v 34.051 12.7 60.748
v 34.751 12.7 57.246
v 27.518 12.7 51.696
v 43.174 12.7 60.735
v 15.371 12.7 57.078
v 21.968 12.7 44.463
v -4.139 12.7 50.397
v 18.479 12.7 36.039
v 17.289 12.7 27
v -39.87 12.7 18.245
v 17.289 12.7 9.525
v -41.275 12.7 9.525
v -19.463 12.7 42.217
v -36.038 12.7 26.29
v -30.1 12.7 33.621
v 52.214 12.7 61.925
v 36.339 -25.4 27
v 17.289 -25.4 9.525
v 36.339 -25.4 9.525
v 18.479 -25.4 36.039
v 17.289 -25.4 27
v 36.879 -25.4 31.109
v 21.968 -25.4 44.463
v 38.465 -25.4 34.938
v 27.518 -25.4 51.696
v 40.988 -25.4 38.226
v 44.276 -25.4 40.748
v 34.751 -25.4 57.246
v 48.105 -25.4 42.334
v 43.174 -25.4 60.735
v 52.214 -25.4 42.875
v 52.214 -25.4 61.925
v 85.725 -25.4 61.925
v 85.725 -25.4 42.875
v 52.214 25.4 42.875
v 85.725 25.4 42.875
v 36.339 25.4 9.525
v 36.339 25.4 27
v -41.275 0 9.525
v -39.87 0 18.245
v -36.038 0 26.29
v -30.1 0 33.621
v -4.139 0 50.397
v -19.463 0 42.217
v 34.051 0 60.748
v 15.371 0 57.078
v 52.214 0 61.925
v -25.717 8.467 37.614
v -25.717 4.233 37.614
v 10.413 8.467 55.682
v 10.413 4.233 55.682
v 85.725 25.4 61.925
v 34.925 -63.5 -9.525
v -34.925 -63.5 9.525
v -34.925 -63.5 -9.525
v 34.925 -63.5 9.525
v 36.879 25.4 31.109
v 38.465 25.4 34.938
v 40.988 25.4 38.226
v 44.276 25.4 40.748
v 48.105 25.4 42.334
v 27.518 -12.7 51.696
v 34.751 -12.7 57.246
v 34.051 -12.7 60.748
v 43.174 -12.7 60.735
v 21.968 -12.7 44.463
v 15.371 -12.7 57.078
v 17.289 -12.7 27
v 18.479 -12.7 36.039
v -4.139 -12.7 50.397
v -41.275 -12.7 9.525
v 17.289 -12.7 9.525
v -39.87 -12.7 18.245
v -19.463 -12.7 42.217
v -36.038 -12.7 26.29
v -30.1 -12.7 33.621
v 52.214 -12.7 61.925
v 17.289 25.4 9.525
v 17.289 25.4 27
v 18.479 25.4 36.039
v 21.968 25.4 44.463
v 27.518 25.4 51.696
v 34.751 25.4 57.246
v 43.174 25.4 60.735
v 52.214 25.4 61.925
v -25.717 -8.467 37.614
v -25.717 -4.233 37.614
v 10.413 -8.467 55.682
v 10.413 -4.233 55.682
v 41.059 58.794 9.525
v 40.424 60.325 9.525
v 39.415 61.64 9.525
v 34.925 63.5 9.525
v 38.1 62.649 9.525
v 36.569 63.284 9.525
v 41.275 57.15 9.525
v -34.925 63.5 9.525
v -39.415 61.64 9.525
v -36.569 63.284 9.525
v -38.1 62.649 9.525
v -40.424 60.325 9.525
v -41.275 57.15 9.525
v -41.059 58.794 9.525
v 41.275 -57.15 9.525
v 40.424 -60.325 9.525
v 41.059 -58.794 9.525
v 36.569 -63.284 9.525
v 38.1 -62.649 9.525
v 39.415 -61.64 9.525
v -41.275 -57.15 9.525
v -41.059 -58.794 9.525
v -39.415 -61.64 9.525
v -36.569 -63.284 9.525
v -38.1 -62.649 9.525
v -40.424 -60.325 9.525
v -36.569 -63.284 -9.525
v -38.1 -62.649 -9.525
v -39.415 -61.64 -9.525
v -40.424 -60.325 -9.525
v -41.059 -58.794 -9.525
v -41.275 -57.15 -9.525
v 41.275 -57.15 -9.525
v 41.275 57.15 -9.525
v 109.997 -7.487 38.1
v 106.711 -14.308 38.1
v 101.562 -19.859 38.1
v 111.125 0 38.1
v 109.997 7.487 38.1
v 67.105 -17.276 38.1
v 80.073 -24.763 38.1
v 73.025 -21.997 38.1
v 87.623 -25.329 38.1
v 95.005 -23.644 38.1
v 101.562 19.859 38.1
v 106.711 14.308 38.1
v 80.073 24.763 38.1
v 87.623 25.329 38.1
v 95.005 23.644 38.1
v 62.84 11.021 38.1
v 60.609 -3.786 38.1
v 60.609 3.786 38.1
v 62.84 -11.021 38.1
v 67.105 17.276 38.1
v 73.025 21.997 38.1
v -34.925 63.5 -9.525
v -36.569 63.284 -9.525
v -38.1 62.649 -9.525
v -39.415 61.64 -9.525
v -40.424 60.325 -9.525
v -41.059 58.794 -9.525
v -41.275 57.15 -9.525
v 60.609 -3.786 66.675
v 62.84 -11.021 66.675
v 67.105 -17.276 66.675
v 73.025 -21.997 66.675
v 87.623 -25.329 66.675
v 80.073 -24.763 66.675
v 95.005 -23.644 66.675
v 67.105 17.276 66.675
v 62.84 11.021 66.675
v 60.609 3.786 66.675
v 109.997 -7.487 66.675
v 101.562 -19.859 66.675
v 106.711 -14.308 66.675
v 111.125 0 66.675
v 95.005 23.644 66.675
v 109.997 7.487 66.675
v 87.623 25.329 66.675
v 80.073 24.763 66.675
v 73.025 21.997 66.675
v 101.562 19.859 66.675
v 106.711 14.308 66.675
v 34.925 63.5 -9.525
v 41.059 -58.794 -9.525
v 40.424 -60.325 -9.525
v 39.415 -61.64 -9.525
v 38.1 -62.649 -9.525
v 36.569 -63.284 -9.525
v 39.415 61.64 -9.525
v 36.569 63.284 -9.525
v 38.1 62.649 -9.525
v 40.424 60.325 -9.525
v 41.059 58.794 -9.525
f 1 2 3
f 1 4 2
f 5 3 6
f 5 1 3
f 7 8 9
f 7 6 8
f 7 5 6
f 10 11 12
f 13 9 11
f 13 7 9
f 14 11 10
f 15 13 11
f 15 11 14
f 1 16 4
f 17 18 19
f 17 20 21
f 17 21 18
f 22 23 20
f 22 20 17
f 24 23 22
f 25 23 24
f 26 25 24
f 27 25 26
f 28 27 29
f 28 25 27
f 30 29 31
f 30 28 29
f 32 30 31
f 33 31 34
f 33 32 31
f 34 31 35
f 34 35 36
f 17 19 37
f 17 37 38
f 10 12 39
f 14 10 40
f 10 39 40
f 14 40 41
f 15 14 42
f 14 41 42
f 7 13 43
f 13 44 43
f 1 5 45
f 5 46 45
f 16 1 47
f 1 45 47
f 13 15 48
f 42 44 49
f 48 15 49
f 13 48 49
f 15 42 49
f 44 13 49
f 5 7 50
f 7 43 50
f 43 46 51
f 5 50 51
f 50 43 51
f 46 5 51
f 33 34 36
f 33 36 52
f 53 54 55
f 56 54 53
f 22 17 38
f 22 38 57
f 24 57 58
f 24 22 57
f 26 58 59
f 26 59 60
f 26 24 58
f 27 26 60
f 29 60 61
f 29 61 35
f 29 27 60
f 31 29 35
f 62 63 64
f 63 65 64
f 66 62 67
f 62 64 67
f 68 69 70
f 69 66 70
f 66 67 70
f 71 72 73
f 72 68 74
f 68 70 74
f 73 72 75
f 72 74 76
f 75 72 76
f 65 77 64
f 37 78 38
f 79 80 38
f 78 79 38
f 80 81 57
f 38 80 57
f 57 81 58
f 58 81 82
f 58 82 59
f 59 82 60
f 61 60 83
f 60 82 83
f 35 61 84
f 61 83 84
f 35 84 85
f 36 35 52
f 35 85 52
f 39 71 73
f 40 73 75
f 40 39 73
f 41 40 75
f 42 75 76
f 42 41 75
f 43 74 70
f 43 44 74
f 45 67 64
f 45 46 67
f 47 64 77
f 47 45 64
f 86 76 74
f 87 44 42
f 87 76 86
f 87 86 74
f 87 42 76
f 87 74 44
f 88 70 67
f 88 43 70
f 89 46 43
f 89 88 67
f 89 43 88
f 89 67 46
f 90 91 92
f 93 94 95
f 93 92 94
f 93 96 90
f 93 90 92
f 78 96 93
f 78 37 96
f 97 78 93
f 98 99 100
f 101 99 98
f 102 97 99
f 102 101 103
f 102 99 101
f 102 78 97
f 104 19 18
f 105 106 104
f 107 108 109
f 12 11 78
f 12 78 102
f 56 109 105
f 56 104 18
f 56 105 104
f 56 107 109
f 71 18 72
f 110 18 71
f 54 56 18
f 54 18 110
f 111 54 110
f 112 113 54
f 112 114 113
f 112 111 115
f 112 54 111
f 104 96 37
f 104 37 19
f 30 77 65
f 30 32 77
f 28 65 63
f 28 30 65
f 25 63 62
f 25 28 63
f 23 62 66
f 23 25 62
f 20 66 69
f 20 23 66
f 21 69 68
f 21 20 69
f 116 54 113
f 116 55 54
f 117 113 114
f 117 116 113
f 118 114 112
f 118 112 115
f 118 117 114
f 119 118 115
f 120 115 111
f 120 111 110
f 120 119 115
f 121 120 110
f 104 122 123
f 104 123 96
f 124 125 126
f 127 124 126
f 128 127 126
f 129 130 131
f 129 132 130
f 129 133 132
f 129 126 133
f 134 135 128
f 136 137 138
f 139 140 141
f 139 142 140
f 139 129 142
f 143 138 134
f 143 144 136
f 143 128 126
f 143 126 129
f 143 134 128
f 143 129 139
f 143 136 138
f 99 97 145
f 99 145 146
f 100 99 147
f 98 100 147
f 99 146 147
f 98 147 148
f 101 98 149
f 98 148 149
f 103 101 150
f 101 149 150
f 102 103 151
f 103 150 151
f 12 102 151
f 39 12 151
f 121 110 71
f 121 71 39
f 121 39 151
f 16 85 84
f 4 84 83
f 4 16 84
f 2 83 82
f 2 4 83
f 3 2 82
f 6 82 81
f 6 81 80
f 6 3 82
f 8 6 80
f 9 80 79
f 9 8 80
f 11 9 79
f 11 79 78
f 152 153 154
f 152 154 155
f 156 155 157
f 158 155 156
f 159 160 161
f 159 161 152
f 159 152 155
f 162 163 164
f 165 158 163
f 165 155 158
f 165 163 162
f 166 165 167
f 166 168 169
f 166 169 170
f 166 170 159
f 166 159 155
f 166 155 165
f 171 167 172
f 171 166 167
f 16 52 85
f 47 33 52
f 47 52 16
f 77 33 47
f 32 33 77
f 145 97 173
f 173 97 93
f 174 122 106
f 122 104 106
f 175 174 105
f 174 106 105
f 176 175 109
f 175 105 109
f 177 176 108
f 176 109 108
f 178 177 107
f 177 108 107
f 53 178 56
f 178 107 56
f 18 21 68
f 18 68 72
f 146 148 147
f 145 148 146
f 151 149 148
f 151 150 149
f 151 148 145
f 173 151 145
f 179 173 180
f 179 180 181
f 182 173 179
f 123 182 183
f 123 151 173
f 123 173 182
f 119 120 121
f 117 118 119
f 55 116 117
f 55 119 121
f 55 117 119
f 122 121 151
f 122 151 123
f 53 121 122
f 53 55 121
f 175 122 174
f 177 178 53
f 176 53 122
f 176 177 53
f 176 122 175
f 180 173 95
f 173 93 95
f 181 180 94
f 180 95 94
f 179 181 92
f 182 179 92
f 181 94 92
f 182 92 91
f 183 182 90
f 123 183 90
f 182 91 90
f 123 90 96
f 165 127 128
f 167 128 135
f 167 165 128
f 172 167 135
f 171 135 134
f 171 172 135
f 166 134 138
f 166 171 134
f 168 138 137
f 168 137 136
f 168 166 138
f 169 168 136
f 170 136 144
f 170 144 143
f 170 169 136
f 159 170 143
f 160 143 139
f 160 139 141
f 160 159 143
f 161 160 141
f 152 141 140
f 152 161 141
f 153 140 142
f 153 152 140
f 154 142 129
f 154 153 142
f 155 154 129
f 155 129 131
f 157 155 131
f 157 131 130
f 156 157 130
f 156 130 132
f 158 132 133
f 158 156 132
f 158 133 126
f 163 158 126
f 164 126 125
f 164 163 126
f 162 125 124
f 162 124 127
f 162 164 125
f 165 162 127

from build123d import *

# Parameters (mm, degrees)
F1_DEPTH = 63.5
F0_W     = 25.4
F0_H     = 19.05
F2_DEPTH = 25.4
F3_DEPTH = 12.7
F5_R     = 6.35


with BuildPart() as f1:
    # F0 (on Front) → F1 (new body, symmetric)
    with BuildSketch(Plane.XZ):
        Polygon((-41.275, -9.525), (41.275, -9.525), (41.275, 9.525), (36.3385356322, 9.525), (17.2885356322, 9.525), (-41.275, 9.525), align=None)
    extrude(amount=F1_DEPTH, both=True)

    # F0 (on Front) → F2 (join, symmetric)
    with BuildSketch(Plane.XZ):
        with BuildLine():
            Line((17.2885356322, 9.525), (36.3385356322, 9.525))
            Line((36.3385356322, 9.525), (36.3385356322, 27.0002))
            ThreePointArc((36.3385356322, 27.0002), (40.9882154809, 38.2255201513), (52.2135356322, 42.8752))
            Line((52.2135356322, 42.8752), (60.325, 42.8752))
            Line((60.325, 42.8752), (60.325, 61.9252))
            Line((60.325, 61.9252), (52.2135356322, 61.9252))
            ThreePointArc((52.2135356322, 61.9252), (27.5178312993, 51.6959043329), (17.2885356322, 27.0002))
            Line((17.2885356322, 27.0002), (17.2885356322, 9.525))
        make_face()
        with Locations((73.025, 52.4002)):
            Rectangle(F0_W, F0_H)
    extrude(amount=F2_DEPTH, both=True)

    # F0 (on Front) → F3 (join, symmetric)
    with BuildSketch(Plane.XZ):
        with BuildLine():
            add(Edge.make_bspline(
                [(-41.275, 9.525), (-40.9712791443, 42.0217514038), (12.5450603664, 62.1972419322), (52.2135356322, 61.9252)],
                knots=[0, 0, 0, 0, 107.1722317333, 107.1722317333, 107.1722317333, 107.1722317333], degree=3))
            Line((-41.275, 9.525), (17.2885356322, 9.525))
            Line((17.2885356322, 9.525), (17.2885356322, 27.0002))
            ThreePointArc((17.2885356322, 27.0002), (27.5178312993, 51.6959043329), (52.2135356322, 61.9252))
        make_face()
    extrude(amount=F3_DEPTH, both=True)

    # F5
    f5_edges = [f1.edges().sort_by_distance(p)[0] for p in [
        (41.275, -63.5, 0),
        (-41.275, -63.5, 0),
        (41.275, 63.5, 0),
        (-41.275, 63.5, 0),
    ]]
    fillet(f5_edges, radius=F5_R)


with BuildPart() as f4:
    # F0 (on Front) → F4 (revolve)
    with BuildSketch(Plane.XZ):
        Polygon((85.725, 66.675), (85.725, 61.9252), (85.725, 42.8752), (85.725, 38.1), (111.125, 38.1), (111.125, 66.675), align=None)
    revolve(axis=Axis((85.725, 0, 52.3875), (0, 0, 1)))


solid = Compound([f1.part, f4.part])
